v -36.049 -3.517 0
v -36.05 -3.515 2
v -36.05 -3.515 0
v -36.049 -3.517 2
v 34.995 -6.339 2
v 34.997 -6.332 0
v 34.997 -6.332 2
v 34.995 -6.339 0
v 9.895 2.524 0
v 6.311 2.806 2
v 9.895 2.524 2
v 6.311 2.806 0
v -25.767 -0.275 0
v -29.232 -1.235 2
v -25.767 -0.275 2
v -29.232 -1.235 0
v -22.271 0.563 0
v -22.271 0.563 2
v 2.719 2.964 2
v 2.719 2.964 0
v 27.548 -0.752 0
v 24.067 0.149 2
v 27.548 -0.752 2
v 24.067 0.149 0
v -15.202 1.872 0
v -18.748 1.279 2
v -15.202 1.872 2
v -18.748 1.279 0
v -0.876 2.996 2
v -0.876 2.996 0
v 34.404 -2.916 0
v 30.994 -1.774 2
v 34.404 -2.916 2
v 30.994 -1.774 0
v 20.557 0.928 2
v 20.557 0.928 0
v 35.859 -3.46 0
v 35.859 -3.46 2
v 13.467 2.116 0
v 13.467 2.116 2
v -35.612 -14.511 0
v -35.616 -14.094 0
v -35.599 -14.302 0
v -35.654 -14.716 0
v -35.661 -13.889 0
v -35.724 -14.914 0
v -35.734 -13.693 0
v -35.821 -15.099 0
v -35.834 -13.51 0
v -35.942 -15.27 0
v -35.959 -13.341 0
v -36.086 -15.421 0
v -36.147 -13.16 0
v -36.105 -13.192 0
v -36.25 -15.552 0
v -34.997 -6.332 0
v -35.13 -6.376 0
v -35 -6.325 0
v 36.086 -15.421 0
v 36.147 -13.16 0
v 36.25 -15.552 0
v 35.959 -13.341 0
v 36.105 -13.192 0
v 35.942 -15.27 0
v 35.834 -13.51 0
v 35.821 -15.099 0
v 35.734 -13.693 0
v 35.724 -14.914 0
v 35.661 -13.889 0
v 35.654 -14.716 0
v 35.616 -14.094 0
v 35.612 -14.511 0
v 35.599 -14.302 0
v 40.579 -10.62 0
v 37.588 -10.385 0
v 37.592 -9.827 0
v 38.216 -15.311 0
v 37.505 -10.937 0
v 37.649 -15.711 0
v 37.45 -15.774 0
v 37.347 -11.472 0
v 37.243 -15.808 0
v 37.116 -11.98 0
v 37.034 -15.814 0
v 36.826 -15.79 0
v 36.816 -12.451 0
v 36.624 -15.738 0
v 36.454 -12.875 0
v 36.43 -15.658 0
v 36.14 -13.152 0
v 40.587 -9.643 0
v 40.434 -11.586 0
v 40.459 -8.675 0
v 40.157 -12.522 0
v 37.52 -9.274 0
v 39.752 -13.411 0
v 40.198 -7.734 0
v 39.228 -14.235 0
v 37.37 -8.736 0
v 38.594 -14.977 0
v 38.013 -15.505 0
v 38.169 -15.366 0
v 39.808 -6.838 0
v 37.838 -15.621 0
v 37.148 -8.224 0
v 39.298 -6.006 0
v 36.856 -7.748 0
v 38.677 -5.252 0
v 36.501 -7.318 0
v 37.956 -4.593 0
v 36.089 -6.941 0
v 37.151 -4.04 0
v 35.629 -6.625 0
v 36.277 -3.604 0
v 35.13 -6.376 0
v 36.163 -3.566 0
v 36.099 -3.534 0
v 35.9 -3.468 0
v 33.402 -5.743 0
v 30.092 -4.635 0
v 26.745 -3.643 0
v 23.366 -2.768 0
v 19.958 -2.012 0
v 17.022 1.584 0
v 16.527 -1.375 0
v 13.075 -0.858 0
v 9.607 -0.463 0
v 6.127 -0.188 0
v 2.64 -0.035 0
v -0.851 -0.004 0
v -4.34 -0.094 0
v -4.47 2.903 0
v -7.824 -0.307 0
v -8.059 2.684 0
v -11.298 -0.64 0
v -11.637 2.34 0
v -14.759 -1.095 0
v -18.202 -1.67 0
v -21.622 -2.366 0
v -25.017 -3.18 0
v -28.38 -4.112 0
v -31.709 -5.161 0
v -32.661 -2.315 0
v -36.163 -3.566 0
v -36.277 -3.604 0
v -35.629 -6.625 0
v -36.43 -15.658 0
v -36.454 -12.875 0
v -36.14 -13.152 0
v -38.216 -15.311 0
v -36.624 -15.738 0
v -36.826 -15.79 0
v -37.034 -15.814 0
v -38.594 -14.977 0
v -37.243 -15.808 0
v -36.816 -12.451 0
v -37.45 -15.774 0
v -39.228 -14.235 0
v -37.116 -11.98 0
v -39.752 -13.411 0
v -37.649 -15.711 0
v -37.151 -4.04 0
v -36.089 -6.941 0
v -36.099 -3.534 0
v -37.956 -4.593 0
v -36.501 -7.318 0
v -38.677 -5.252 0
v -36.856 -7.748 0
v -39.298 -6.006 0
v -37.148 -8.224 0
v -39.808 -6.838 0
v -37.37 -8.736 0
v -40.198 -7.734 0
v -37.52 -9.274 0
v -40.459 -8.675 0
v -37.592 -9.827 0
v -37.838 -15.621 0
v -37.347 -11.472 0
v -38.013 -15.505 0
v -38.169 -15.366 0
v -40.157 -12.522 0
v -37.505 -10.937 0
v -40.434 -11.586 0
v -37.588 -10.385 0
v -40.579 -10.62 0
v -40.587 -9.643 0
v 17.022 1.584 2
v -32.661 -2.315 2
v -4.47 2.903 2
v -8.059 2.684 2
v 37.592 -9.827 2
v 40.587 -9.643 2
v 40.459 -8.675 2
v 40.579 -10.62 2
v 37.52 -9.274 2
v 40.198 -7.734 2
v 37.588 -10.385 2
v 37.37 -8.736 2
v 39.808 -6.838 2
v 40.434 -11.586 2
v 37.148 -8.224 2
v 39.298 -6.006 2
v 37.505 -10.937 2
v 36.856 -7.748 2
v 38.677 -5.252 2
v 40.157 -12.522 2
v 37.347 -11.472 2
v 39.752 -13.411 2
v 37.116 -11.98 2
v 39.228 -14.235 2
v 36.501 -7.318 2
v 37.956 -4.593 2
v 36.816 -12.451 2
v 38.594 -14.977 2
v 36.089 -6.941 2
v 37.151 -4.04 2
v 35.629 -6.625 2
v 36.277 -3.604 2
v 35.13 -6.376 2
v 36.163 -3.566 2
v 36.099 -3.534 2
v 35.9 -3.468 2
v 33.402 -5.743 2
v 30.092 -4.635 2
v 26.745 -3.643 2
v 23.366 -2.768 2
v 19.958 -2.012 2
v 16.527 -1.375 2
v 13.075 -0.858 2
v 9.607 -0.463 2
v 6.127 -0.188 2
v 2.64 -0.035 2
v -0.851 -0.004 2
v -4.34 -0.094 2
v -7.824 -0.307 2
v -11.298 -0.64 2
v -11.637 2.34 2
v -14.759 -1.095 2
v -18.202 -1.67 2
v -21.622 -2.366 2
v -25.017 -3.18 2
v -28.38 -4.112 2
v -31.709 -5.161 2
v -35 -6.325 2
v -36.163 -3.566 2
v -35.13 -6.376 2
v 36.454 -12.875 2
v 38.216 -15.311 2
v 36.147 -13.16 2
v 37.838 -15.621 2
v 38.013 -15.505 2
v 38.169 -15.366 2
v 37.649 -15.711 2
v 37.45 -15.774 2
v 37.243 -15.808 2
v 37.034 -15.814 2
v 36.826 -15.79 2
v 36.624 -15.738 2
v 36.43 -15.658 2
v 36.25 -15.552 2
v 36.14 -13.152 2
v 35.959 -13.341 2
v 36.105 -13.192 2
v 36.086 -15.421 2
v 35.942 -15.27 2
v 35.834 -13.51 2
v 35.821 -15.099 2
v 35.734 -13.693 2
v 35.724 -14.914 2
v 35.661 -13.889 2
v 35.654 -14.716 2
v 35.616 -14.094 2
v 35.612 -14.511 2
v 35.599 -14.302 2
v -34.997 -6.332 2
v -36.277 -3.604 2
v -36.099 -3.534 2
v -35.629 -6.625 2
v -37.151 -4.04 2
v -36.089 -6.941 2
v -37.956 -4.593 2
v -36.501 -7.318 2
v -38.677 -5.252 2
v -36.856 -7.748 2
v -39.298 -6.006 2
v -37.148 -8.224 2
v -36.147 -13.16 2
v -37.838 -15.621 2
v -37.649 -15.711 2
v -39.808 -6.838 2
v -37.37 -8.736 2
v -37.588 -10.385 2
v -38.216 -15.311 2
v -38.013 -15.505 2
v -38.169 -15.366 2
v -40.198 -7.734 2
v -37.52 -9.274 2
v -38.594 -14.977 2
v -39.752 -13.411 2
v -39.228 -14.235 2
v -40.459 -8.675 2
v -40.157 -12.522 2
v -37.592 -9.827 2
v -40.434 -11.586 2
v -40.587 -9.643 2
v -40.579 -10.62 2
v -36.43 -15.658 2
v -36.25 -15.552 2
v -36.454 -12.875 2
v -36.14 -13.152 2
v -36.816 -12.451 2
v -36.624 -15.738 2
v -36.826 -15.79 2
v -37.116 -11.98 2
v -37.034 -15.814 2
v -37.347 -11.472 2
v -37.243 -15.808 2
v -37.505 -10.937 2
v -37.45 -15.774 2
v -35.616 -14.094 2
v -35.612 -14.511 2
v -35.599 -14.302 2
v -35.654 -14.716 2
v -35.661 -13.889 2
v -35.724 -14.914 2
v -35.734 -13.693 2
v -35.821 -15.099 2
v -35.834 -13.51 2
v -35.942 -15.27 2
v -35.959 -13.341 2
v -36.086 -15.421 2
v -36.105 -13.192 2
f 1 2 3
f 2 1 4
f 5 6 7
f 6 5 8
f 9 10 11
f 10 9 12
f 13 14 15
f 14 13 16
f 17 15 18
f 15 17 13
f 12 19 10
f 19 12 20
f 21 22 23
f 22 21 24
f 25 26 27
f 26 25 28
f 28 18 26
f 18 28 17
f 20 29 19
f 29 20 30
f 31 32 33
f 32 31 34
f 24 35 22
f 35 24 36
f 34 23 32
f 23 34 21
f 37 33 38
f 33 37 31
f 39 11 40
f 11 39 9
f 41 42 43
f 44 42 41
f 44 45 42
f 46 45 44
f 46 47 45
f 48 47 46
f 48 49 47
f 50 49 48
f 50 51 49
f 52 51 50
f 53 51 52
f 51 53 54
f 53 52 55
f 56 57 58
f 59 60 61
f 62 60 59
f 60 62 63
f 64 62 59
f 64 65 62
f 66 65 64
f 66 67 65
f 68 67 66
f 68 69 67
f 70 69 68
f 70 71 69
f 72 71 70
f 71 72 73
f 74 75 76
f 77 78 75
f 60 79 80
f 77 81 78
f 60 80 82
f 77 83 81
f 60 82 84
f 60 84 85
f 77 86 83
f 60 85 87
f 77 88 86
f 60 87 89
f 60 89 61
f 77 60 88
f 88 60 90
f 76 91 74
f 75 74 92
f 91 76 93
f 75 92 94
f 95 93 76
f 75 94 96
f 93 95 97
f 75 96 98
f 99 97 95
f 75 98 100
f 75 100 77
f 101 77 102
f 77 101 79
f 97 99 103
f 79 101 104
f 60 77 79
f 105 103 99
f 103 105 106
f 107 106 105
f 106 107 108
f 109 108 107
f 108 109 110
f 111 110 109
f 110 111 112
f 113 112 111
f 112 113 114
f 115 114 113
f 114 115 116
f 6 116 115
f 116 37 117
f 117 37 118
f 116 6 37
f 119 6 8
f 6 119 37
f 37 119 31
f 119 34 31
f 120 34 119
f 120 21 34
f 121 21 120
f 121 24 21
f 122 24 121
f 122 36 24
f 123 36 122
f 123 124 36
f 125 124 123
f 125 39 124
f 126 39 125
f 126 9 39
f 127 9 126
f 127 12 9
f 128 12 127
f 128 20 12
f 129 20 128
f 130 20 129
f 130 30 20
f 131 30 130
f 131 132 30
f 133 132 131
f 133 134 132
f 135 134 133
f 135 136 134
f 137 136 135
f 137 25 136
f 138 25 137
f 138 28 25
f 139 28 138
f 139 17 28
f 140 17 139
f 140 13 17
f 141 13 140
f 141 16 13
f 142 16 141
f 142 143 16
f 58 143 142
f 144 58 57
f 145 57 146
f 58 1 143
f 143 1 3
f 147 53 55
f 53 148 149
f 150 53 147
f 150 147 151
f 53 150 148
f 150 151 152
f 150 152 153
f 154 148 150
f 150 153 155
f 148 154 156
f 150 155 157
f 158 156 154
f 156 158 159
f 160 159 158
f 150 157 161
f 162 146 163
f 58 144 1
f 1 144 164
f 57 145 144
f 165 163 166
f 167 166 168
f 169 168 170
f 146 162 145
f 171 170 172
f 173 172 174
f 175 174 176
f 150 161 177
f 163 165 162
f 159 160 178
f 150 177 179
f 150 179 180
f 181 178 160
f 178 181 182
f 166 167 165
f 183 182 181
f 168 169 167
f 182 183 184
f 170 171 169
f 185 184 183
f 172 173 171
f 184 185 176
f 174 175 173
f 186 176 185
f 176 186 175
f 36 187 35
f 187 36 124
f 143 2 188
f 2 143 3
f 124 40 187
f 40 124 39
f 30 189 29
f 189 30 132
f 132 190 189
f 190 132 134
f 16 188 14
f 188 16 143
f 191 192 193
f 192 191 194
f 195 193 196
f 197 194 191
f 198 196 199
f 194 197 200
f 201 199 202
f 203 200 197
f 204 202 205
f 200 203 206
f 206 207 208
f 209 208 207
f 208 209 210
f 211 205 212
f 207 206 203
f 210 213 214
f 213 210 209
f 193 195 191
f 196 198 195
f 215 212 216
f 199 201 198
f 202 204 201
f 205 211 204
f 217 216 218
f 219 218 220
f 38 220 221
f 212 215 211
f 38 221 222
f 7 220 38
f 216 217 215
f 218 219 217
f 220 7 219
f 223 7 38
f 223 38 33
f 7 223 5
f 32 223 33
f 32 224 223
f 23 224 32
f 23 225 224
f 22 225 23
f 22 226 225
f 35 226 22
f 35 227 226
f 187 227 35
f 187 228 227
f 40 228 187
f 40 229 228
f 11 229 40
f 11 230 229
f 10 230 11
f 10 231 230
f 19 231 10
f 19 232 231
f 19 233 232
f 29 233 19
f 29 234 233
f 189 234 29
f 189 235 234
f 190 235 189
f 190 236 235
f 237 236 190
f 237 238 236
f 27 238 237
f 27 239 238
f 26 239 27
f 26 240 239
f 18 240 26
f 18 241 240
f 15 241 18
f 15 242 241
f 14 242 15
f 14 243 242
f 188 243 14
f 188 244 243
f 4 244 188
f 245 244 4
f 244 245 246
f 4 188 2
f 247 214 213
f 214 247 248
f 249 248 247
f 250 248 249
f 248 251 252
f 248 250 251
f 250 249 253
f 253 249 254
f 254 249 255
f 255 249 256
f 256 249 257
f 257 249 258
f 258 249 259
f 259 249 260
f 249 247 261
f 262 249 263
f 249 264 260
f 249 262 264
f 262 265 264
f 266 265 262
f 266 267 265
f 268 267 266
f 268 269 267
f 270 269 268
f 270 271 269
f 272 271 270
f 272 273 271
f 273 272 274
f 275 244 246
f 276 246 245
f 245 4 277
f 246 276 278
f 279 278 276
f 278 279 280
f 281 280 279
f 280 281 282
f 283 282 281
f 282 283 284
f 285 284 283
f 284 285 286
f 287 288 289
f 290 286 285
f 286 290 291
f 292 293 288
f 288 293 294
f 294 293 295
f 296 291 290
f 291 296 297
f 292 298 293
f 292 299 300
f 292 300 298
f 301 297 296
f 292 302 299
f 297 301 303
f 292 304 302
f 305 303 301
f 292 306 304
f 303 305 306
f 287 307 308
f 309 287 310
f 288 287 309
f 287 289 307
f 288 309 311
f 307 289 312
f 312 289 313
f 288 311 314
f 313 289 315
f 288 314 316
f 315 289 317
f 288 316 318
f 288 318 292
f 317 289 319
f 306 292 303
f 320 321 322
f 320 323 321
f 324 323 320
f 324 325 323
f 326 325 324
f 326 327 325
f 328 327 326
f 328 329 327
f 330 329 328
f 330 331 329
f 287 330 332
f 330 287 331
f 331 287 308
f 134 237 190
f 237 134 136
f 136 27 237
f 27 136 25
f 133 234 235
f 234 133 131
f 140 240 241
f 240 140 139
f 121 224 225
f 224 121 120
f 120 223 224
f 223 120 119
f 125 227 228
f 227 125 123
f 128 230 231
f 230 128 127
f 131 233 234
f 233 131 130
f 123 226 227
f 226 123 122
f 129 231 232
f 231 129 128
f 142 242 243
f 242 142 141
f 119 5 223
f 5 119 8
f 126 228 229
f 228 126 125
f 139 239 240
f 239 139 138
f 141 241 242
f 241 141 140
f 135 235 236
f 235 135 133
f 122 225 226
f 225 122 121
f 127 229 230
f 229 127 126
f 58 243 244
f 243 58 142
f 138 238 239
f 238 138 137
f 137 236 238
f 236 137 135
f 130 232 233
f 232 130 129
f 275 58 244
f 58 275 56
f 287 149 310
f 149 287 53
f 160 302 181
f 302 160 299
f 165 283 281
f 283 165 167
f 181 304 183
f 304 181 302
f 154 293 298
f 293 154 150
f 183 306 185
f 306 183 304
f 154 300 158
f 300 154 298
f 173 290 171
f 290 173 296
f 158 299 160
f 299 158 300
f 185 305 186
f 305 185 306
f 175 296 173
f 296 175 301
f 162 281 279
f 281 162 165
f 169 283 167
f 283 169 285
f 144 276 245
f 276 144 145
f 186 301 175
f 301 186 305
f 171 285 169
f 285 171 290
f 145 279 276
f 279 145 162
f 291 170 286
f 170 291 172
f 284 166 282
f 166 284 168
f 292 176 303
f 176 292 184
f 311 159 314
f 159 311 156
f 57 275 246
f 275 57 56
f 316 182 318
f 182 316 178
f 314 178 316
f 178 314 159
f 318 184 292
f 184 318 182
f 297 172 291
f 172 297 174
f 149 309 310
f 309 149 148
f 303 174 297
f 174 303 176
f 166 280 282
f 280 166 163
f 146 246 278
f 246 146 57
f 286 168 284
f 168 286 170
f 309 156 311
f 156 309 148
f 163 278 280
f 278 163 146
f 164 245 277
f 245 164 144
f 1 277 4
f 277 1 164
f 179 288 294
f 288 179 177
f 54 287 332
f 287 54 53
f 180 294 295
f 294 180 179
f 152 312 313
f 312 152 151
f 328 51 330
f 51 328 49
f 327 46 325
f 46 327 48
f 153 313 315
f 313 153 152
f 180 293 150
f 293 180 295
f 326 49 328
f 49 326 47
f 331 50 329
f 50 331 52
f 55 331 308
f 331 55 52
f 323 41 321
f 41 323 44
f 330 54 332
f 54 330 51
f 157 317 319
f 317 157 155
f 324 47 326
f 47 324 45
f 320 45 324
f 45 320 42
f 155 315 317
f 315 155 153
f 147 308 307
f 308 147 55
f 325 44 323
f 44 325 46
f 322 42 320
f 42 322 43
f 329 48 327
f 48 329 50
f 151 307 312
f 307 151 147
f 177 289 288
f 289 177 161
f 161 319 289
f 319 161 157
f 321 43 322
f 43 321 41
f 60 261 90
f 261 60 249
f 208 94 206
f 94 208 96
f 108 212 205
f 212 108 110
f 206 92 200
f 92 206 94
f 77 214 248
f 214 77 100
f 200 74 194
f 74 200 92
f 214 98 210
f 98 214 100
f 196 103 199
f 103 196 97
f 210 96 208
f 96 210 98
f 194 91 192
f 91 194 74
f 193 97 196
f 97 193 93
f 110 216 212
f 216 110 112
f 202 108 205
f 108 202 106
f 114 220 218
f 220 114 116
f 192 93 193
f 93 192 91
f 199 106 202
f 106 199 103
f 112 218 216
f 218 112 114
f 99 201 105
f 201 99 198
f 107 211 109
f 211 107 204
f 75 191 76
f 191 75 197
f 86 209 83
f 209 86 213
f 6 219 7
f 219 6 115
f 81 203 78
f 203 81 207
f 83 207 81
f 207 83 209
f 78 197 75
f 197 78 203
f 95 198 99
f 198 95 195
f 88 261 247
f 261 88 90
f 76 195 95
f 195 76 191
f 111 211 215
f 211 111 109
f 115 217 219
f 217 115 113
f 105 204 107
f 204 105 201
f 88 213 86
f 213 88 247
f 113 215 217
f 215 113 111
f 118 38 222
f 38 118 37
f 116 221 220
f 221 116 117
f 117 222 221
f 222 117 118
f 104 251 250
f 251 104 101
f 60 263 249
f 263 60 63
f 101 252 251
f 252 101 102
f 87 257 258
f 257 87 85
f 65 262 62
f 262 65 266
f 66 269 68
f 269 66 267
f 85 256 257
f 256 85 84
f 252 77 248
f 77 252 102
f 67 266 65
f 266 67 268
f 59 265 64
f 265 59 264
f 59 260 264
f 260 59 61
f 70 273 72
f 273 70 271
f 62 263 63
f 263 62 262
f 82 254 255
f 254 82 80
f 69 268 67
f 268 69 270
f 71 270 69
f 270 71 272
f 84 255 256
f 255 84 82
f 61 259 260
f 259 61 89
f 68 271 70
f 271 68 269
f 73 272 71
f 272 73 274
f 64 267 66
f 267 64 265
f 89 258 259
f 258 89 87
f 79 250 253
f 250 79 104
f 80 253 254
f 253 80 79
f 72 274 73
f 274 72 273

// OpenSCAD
// Length of the stand
_length = 70;

// height of the stand
_height = 2;

// Curvature of the stand (lower values for a flatter arc, 100 for a semicircle)
_curvature = 35; //[50:100]

// Thickness of the stand
_thickness = 3;

// Radius at the ends where it clips to the device
_clip_radius = 4;

// How far around the device the clips run
_clip_angle = 120; //[60:180]



////////////////////////////////////////////////////////////////////////



// only works from [0 to 180] degrees, runs clockwise from 12 o'clock
module smallArc(radius0, radius1, angle, depth) {
	thickness = radius1 - radius0;
	eps = 0.1;

	union() {
		difference() {
			// full arc
			cylinder(r=radius1, h=depth, center=true);
			cylinder(r=radius0, h=depth+2*eps, center=true);

			for(z=[0, 180 - angle]) {
				rotate([0,0,z])
				translate([-radius1,0,0])			
				cube(size = [radius1*2, radius1*2, depth+eps], center=true);
			}
		}
	}
}



// arc from [0 to 360] degrees with rounded ends, runs clockwise from 12 o'clock, rounded tips not included in angle computation
module roundArc(radius0, radius1, angle, depth) {
	thickness = radius1 - radius0;
	cutAngle = 360-angle;
	centerRadius = (radius0 + radius1)/2.0;
	union() {
		if (angle > 180) {
			smallArc(radius0, radius1, 180, depth);
			rotate([0,0,-180]) {
				smallArc(radius0, radius1, angle-180, depth);
			}
		} else {
			smallArc(radius0, radius1, angle, depth);
		}

		// round ends
		for(t = [ [0,centerRadius,0], 
					 [centerRadius * -sin(cutAngle), centerRadius * cos(cutAngle),0] ]) {
			translate(t) {
				cylinder(r=thickness/2, h=depth, center=true);
			}
		}
	}
}

module makeStand(arcRadius, angle, height, outerThickness, clipRadius, clipAngle) {
	ir = arcRadius;
	or = ir + outerThickness;
	cx = (ir-clipRadius)*sin(angle/2);
	cy = (ir-clipRadius)*cos(angle/2);

	union() {

		//	spine
		rotate([0,0,angle/2]) {
			smallArc(ir, or, angle, height, $fn=180);
		}

		// clip
		for (m=[1,0]) {
			mirror([m,0,0]) {
				translate([cx, cy, 0])
				rotate([0,0,-angle/2]) {
					roundArc(clipRadius, clipRadius+outerThickness, clipAngle, height, $fn=45);
				}
			}
		}
	}
}

module make() {
	radius = _length / (2 *(_curvature/100));
	angle = 2 * asin(_length/(2*radius));

	translate([0,-radius,_height/2]) {
			makeStand(radius, 
					  angle, 
					  _height, 
					  _thickness, 
					  _clip_radius,
					  _clip_angle);
		}
}

make();
